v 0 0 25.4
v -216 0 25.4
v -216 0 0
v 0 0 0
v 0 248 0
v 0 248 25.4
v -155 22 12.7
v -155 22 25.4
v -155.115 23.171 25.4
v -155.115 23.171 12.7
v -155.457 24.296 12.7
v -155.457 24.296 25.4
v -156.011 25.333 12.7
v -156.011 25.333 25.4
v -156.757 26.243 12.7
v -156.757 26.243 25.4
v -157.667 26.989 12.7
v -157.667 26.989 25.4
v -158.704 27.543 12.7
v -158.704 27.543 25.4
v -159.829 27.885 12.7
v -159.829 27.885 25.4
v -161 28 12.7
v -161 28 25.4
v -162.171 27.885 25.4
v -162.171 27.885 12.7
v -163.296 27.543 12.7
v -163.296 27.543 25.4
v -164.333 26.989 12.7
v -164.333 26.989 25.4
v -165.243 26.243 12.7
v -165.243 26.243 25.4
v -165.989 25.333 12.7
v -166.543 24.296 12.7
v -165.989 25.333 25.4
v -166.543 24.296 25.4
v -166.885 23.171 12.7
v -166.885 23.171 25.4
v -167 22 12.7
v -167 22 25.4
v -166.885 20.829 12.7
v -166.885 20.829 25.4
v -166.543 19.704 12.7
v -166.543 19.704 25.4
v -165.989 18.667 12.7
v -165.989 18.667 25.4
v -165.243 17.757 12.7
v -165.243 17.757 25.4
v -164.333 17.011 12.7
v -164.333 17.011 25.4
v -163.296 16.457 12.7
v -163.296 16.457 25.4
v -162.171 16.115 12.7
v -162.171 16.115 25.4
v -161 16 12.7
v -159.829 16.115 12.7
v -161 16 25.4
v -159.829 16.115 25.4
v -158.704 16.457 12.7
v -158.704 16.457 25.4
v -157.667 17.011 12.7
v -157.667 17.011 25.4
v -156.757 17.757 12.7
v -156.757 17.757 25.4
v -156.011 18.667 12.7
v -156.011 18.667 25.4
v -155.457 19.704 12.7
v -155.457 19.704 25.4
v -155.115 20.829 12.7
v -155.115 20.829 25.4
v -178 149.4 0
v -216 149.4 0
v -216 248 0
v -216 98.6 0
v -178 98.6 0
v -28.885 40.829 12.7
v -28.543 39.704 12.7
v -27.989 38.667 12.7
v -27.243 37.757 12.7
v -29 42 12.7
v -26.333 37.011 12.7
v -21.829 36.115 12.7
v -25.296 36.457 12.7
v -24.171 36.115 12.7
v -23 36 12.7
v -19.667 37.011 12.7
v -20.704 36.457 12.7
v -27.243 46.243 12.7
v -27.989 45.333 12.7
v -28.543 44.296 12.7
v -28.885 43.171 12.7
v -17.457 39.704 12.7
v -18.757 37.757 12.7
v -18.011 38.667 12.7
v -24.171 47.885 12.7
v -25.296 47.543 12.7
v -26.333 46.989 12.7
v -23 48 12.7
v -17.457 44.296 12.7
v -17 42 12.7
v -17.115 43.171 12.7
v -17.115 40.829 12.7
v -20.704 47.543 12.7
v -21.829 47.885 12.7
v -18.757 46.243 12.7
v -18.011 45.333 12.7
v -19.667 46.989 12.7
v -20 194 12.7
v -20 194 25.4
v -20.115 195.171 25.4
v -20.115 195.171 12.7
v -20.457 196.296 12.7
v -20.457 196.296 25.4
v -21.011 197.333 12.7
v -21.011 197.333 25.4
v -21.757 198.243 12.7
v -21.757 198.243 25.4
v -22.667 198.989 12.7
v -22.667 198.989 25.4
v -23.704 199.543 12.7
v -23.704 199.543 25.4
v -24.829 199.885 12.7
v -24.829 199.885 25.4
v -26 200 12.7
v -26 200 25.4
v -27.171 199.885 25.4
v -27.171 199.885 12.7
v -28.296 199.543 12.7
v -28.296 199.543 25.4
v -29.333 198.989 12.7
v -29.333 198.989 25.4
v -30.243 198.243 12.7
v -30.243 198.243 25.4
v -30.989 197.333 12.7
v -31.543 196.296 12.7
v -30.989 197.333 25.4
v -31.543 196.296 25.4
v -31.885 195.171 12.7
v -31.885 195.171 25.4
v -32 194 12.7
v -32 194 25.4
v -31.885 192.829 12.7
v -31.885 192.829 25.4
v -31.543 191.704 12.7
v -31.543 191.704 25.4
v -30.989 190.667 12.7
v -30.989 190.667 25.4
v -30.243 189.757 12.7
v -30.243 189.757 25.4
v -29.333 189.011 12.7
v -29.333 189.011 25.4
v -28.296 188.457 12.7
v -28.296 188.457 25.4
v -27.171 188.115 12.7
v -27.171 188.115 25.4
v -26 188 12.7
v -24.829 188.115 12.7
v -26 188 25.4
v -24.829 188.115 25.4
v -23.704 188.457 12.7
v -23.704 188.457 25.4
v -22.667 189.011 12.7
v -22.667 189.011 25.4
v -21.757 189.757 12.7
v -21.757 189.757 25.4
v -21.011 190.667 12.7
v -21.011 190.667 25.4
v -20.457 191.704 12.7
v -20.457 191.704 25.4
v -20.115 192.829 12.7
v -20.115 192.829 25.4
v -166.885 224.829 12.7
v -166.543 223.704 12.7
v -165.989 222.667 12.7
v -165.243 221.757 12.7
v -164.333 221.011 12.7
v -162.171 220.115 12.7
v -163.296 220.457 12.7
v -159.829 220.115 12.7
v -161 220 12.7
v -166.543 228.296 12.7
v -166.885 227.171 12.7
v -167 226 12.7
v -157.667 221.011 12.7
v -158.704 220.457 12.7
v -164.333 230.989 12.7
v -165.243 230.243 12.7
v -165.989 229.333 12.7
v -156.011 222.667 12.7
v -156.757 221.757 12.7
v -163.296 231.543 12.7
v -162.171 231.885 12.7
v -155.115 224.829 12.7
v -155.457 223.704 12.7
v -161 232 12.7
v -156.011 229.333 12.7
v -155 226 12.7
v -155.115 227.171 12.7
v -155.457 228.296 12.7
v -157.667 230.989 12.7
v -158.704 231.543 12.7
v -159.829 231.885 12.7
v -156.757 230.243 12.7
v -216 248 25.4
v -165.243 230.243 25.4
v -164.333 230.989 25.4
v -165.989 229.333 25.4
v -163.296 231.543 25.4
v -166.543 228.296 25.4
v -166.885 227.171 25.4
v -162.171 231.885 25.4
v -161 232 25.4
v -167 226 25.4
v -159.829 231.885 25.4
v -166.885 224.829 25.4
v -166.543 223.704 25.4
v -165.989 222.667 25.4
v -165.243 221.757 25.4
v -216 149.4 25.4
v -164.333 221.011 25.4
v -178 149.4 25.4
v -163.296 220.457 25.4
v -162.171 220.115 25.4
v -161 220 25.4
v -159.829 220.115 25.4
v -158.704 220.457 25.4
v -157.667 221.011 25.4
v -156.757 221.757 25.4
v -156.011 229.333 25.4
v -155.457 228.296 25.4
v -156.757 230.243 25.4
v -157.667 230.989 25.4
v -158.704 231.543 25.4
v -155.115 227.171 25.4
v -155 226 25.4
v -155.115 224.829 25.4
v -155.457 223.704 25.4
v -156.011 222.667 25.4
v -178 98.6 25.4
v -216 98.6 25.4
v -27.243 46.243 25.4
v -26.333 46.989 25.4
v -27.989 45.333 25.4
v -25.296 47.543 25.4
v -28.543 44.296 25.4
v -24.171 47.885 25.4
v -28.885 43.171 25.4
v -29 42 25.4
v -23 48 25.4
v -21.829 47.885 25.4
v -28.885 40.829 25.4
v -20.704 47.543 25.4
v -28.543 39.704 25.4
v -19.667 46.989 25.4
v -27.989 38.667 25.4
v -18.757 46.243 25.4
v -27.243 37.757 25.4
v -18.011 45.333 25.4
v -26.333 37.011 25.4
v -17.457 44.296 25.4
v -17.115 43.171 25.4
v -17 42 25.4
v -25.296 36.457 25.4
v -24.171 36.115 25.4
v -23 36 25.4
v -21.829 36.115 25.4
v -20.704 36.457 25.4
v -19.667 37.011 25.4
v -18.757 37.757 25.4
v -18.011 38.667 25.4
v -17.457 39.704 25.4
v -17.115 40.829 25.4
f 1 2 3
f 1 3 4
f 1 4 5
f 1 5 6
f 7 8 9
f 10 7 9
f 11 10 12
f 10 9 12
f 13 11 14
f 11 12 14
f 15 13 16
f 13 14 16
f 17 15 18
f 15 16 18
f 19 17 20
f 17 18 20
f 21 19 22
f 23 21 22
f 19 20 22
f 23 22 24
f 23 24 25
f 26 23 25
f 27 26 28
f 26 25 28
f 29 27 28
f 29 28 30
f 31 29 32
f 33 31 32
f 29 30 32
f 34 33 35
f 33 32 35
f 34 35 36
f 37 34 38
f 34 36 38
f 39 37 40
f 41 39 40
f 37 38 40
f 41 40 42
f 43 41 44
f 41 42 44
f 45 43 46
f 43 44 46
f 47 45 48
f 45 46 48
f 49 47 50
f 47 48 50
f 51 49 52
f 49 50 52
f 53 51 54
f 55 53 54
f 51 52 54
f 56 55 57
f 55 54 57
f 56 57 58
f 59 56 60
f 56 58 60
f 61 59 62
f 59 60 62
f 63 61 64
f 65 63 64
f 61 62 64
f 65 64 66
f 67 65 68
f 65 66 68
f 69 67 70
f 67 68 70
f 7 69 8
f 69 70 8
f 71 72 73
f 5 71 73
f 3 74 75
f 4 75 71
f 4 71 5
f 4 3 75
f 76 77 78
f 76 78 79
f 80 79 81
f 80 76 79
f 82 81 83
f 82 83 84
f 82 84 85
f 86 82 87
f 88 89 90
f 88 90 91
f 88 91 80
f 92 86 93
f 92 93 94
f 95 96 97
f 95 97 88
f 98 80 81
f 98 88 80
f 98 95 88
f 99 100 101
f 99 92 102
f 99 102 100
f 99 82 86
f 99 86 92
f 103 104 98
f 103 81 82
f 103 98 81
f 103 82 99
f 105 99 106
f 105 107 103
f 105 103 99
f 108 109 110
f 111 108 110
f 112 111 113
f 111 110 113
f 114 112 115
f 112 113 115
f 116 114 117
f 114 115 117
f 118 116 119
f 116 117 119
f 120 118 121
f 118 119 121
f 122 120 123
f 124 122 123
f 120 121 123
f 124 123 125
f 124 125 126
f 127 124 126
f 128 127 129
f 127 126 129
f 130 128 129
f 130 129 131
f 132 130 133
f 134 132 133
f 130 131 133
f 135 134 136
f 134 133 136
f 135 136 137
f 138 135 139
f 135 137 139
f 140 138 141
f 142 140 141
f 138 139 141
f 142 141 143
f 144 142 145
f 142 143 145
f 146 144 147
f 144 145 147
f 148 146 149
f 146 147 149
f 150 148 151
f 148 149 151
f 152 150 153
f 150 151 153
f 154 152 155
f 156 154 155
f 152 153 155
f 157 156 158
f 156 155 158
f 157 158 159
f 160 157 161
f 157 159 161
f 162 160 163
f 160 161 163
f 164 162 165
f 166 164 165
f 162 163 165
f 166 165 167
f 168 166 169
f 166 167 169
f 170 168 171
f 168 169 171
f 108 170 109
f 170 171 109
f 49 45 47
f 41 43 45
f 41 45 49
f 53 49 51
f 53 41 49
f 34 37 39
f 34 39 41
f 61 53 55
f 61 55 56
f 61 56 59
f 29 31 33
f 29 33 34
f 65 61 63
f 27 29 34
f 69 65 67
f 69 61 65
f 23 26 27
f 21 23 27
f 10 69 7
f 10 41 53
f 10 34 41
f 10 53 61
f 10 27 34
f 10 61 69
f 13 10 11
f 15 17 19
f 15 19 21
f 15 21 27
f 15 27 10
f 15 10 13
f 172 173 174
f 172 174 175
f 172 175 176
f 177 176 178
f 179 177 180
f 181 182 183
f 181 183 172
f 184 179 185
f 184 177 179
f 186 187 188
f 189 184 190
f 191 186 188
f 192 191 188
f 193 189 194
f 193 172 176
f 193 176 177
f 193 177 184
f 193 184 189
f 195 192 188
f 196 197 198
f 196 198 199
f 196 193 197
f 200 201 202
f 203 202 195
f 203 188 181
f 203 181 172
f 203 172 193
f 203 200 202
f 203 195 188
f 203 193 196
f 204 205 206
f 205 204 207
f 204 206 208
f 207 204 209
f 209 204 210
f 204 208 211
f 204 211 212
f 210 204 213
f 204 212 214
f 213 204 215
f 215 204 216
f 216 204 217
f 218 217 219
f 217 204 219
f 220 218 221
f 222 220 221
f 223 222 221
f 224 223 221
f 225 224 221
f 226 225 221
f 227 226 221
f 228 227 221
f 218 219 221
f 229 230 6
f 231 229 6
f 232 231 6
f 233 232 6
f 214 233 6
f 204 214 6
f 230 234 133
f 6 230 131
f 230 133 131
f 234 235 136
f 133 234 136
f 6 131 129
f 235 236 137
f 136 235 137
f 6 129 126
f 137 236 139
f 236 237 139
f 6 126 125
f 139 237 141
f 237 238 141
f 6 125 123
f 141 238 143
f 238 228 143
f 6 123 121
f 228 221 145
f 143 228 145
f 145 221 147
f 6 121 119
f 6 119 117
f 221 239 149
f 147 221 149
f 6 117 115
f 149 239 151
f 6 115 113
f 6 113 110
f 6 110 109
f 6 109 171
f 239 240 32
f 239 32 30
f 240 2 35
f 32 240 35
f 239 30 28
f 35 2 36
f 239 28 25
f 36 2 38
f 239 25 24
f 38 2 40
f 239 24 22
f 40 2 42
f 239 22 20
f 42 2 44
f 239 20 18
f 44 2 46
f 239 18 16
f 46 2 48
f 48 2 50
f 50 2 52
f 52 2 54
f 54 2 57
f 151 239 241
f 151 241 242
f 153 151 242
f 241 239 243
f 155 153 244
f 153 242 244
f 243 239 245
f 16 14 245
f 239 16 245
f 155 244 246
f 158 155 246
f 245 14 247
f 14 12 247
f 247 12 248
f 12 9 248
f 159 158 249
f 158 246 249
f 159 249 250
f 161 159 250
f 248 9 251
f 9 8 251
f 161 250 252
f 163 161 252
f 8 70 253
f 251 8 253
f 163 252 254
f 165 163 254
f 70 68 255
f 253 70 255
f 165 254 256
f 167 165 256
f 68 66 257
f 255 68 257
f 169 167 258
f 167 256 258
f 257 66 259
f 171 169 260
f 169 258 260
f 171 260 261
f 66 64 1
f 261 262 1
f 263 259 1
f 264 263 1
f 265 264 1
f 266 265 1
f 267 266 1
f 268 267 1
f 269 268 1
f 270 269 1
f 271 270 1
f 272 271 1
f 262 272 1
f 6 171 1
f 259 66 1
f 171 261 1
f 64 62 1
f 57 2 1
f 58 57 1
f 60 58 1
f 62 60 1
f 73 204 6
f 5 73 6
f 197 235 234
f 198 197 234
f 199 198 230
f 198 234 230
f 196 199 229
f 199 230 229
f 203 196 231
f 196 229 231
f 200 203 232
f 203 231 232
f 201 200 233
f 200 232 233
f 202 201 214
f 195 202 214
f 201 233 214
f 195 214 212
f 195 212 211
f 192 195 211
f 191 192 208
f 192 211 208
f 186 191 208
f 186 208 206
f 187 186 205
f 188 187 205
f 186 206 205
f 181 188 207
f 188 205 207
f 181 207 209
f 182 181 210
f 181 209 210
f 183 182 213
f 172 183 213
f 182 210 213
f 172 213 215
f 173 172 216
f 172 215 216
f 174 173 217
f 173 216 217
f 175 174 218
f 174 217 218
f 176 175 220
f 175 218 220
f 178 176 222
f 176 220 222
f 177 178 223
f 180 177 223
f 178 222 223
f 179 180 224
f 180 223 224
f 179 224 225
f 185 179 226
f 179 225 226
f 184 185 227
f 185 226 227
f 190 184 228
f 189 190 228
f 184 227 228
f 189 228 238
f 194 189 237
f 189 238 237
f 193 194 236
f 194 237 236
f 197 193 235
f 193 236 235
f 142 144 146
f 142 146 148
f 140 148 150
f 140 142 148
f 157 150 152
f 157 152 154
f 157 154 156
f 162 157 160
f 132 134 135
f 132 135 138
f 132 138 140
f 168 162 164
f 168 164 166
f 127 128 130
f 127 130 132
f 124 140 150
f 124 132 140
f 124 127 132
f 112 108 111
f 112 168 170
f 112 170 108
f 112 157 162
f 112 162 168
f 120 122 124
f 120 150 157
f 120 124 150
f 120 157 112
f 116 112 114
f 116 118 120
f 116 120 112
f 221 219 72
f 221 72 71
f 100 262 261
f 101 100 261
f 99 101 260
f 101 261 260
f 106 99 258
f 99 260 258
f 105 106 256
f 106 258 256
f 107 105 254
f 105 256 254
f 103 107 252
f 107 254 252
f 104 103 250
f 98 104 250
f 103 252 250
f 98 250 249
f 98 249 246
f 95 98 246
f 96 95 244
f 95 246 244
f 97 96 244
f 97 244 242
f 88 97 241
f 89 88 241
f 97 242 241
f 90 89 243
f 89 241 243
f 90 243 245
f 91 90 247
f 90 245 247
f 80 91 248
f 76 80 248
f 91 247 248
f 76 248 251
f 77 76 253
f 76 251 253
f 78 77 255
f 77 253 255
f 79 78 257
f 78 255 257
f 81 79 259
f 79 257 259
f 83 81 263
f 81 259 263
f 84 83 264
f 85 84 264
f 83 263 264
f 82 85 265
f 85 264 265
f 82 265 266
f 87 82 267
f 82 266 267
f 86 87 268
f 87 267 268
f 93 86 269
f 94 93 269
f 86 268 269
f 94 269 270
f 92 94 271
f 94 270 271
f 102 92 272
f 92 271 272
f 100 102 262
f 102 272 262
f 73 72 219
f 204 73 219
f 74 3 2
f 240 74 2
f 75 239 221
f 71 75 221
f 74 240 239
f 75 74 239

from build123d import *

# Parameters (mm, degrees)
F0_W     = 216
F0_H     = 25.4
F1_DEPTH = 248
F2_R     = 6
F3_DEPTH = 12.7
F4_W     = 38
F4_H     = 50.8
F5_DEPTH = 25.4


with BuildPart() as f1:
    # F0 (on Front) → F1 (new body)
    with BuildSketch(Plane.XZ):
        with Locations((-108, 12.7)):
            Rectangle(F0_W, F0_H)
    extrude(amount=-F1_DEPTH)

    # F2 (on face) → F3 (cut)
    with BuildSketch(Plane.XY.offset(25.4)):
        with Locations((-161, 226)):
            Circle(F2_R)
        with Locations((-161, 22)):
            Circle(F2_R)
        with Locations((-26, 194)):
            Circle(F2_R)
        with Locations((-23, 42)):
            Circle(F2_R)
    extrude(amount=-F3_DEPTH, mode=Mode.SUBTRACT)

    # F4 (on face) → F5 (cut, through all)
    with BuildSketch(Plane.XY.offset(25.4)):
        with Locations((-197, 124)):
            Rectangle(F4_W, F4_H)
    extrude(amount=-F5_DEPTH, mode=Mode.SUBTRACT)


solid = f1.part
